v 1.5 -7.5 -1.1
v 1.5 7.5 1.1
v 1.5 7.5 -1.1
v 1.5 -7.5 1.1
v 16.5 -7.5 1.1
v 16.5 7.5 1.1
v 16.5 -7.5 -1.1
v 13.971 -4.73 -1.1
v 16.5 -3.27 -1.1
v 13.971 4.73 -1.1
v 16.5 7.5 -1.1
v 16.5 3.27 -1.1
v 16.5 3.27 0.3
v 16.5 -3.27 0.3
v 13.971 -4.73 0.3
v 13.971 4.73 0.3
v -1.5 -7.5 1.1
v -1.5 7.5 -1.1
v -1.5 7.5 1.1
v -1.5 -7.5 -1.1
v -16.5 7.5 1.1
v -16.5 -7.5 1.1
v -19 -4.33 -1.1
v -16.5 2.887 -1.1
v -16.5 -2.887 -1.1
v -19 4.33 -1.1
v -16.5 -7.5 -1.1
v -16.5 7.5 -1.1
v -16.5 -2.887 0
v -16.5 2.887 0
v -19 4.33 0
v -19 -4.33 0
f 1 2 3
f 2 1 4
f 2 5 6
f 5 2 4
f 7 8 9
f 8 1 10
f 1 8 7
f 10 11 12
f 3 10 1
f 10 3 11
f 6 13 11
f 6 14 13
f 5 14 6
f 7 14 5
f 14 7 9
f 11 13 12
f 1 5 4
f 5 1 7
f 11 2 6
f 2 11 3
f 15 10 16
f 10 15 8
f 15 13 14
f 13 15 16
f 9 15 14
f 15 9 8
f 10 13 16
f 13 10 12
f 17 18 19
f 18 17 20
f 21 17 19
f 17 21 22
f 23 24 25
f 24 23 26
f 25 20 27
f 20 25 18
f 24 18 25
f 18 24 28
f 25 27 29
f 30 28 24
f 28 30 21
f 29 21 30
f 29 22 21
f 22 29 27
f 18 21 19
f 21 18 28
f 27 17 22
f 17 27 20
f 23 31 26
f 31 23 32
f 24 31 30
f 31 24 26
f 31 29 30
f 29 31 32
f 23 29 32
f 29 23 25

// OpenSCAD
side=30;
//thickness of the board
thick=2.2;
edge_thick=3;
//coefficient of the thickness of the board
edge_height_coef=1.5;//[1:0.1:3]

//printer tolerance (only affect "color 02" parts)
tolerance=0.2;//[0:0.05:0.7]
//definition (only affect corners)
$fn=60;
render="Test part";//[Corner color 01,Corner color 02,Edge color 01,Edge color 02,Center color 01,Center color 02,Test part]

////////
module slot() {
translate([-side/2,0,-thick/2-0.2]) rotate([0,0,180]) translate([0.2,0,0]) hull() {for(i=[-1,1]) translate([-0.5-2*tolerance/1.75,i*(0.866+2*tolerance),0]) cylinder(d=8,h=thick/2+0.5,$fn=3);}
}
module couleur01(a) {
    cube([side,side,thick],center=true);
    for(i=[0,90]) rotate([0,0,i])
    translate([-side/2,0,-thick/2]) cylinder(d=10,h=thick/2,$fn=3);
    if (a==2) {
        for(i=[0,-90]) rotate([0,0,i])
        translate([-side/2,side/2,-thick/2]) cube([side,edge_thick,edge_height_coef*thick]);
        difference() {
            translate([side/2,side/2,-thick/2]) cylinder(r=edge_thick,h=edge_height_coef*thick);
            cube([side,side,2*edge_height_coef*thick],center=true);
        }
    }
    if (a==3) {
        rotate([0,0,180])
        translate([-side/2,0,-thick/2]) cylinder(d=10,h=thick/2,$fn=3);
        translate([-side/2,side/2,-thick/2]) cube([side,edge_thick,edge_height_coef*thick]);
    }
    else if (a==4) {
        for(i=[180,-90]) rotate([0,0,i])
        translate([-side/2,0,-thick/2]) cylinder(d=10,h=thick/2,$fn=3);
    }
    else {};
}

module couleur02(a) {
    difference() {
        cube([side,side,thick],center=true);
        for(i=[0,90]) rotate([0,0,i])
        slot();
        if (a==3) {
            rotate([0,0,180]) slot();
        }
        else if (a==4) {
            for(i=[180,-90]) rotate([0,0,i]) slot();
        }
        else {};
    }
    if (a==2) {
        for(i=[0,-90]) rotate([0,0,i])
        translate([-side/2,side/2,-thick/2]) cube([side,edge_thick,edge_height_coef*thick]);
        difference() {
            translate([side/2,side/2,-thick/2]) cylinder(r=edge_thick,h=edge_height_coef*thick);
            cube([side,side,2*edge_height_coef*thick],center=true);
        }
    }
    if (a==3) {
        translate([-side/2,side/2,-thick/2]) cube([side,edge_thick,edge_height_coef*thick]);
    }
}

if (render=="Corner color 01") {
    couleur01(2);
}
else if (render=="Corner color 02") {
    couleur02(2);
}
else if (render=="Edge color 01") {
    couleur01(3);
}
else if (render=="Edge color 02") {
    couleur02(3);
}
else if (render=="Center color 01") {
    couleur01(4);
}
else if (render=="Center color 02") {
    couleur02(4);
}
else if (render=="Test part") {
    rotate([0,0,180]) translate([-1.5,0,0]) difference() {
        translate([-7.5,0,0]) cube([15,15,thick],center=true);
        translate([-30/2,0,-thick/2-0.2]) rotate([0,0,180]) translate([0.2,0,0]) hull() {for(i=[-1,1]) translate([-0.5-2*tolerance/1.75,i*(0.866+2*tolerance),0]) cylinder(d=8,h=thick/2+0.5,$fn=3);}
    }
    translate([-1.5,0,0]) union() {
        translate([-7.5,0,0]) cube([15,15,thick],center=true);
        translate([-30/2,0,-thick/2]) cylinder(d=10,h=thick/2,$fn=3);
    }
}
